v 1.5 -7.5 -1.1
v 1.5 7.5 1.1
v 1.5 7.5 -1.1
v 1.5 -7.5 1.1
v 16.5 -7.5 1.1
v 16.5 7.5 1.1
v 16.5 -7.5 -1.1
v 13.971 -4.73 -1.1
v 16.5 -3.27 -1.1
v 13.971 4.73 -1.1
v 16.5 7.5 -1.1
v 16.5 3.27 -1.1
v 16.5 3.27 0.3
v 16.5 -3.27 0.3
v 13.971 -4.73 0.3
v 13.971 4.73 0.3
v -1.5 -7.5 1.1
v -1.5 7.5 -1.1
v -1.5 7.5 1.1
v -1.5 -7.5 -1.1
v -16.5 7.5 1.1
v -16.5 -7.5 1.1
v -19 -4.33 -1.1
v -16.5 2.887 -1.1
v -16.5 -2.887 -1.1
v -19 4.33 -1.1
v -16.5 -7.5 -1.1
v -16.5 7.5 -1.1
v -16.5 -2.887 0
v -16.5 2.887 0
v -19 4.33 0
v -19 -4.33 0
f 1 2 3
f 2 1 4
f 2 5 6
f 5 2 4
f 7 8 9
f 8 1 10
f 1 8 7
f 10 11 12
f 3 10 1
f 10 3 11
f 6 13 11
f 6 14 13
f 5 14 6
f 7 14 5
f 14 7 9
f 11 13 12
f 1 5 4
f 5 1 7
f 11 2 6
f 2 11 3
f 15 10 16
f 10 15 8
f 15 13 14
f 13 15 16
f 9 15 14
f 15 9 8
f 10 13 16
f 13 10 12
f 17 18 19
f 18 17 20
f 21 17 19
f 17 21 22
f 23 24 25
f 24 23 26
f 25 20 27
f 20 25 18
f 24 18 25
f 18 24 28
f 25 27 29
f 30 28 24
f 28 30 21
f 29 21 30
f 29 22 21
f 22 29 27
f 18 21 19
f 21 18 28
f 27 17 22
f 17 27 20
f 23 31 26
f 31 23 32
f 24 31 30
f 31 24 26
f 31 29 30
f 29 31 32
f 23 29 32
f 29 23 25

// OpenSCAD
side=30;
//thickness of the board
thick=2.2;
edge_thick=3;
//coefficient of the thickness of the board
edge_height_coef=1.5;//[1:0.1:3]

//printer tolerance (only affect "color 02" parts)
tolerance=0.2;//[0:0.05:0.7]
//definition (only affect corners)
$fn=60;
render="Test part";//[Corner color 01,Corner color 02,Edge color 01,Edge color 02,Center color 01,Center color 02,Test part]

////////
module slot() {
translate([-side/2,0,-thick/2-0.2]) rotate([0,0,180]) translate([0.2,0,0]) hull() {for(i=[-1,1]) translate([-0.5-2*tolerance/1.75,i*(0.866+2*tolerance),0]) cylinder(d=8,h=thick/2+0.5,$fn=3);}
}
module couleur01(a) {
    cube([side,side,thick],center=true);
    for(i=[0,90]) rotate([0,0,i])
    translate([-side/2,0,-thick/2]) cylinder(d=10,h=thick/2,$fn=3);
    if (a==2) {
        for(i=[0,-90]) rotate([0,0,i])
        translate([-side/2,side/2,-thick/2]) cube([side,edge_thick,edge_height_coef*thick]);
        difference() {
            translate([side/2,side/2,-thick/2]) cylinder(r=edge_thick,h=edge_height_coef*thick);
            cube([side,side,2*edge_height_coef*thick],center=true);
        }
    }
    if (a==3) {
        rotate([0,0,180])
        translate([-side/2,0,-thick/2]) cylinder(d=10,h=thick/2,$fn=3);
        translate([-side/2,side/2,-thick/2]) cube([side,edge_thick,edge_height_coef*thick]);
    }
    else if (a==4) {
        for(i=[180,-90]) rotate([0,0,i])
        translate([-side/2,0,-thick/2]) cylinder(d=10,h=thick/2,$fn=3);
    }
    else {};
}

module couleur02(a) {
    difference() {
        cube([side,side,thick],center=true);
        for(i=[0,90]) rotate([0,0,i])
        slot();
        if (a==3) {
            rotate([0,0,180]) slot();
        }
        else if (a==4) {
            for(i=[180,-90]) rotate([0,0,i]) slot();
        }
        else {};
    }
    if (a==2) {
        for(i=[0,-90]) rotate([0,0,i])
        translate([-side/2,side/2,-thick/2]) cube([side,edge_thick,edge_height_coef*thick]);
        difference() {
            translate([side/2,side/2,-thick/2]) cylinder(r=edge_thick,h=edge_height_coef*thick);
            cube([side,side,2*edge_height_coef*thick],center=true);
        }
    }
    if (a==3) {
        translate([-side/2,side/2,-thick/2]) cube([side,edge_thick,edge_height_coef*thick]);
    }
}

if (render=="Corner color 01") {
    couleur01(2);
}
else if (render=="Corner color 02") {
    couleur02(2);
}
else if (render=="Edge color 01") {
    couleur01(3);
}
else if (render=="Edge color 02") {
    couleur02(3);
}
else if (render=="Center color 01") {
    couleur01(4);
}
else if (render=="Center color 02") {
    couleur02(4);
}
else if (render=="Test part") {
    rotate([0,0,180]) translate([-1.5,0,0]) difference() {
        translate([-7.5,0,0]) cube([15,15,thick],center=true);
        translate([-30/2,0,-thick/2-0.2]) rotate([0,0,180]) translate([0.2,0,0]) hull() {for(i=[-1,1]) translate([-0.5-2*tolerance/1.75,i*(0.866+2*tolerance),0]) cylinder(d=8,h=thick/2+0.5,$fn=3);}
    }
    translate([-1.5,0,0]) union() {
        translate([-7.5,0,0]) cube([15,15,thick],center=true);
        translate([-30/2,0,-thick/2]) cylinder(d=10,h=thick/2,$fn=3);
    }
}
